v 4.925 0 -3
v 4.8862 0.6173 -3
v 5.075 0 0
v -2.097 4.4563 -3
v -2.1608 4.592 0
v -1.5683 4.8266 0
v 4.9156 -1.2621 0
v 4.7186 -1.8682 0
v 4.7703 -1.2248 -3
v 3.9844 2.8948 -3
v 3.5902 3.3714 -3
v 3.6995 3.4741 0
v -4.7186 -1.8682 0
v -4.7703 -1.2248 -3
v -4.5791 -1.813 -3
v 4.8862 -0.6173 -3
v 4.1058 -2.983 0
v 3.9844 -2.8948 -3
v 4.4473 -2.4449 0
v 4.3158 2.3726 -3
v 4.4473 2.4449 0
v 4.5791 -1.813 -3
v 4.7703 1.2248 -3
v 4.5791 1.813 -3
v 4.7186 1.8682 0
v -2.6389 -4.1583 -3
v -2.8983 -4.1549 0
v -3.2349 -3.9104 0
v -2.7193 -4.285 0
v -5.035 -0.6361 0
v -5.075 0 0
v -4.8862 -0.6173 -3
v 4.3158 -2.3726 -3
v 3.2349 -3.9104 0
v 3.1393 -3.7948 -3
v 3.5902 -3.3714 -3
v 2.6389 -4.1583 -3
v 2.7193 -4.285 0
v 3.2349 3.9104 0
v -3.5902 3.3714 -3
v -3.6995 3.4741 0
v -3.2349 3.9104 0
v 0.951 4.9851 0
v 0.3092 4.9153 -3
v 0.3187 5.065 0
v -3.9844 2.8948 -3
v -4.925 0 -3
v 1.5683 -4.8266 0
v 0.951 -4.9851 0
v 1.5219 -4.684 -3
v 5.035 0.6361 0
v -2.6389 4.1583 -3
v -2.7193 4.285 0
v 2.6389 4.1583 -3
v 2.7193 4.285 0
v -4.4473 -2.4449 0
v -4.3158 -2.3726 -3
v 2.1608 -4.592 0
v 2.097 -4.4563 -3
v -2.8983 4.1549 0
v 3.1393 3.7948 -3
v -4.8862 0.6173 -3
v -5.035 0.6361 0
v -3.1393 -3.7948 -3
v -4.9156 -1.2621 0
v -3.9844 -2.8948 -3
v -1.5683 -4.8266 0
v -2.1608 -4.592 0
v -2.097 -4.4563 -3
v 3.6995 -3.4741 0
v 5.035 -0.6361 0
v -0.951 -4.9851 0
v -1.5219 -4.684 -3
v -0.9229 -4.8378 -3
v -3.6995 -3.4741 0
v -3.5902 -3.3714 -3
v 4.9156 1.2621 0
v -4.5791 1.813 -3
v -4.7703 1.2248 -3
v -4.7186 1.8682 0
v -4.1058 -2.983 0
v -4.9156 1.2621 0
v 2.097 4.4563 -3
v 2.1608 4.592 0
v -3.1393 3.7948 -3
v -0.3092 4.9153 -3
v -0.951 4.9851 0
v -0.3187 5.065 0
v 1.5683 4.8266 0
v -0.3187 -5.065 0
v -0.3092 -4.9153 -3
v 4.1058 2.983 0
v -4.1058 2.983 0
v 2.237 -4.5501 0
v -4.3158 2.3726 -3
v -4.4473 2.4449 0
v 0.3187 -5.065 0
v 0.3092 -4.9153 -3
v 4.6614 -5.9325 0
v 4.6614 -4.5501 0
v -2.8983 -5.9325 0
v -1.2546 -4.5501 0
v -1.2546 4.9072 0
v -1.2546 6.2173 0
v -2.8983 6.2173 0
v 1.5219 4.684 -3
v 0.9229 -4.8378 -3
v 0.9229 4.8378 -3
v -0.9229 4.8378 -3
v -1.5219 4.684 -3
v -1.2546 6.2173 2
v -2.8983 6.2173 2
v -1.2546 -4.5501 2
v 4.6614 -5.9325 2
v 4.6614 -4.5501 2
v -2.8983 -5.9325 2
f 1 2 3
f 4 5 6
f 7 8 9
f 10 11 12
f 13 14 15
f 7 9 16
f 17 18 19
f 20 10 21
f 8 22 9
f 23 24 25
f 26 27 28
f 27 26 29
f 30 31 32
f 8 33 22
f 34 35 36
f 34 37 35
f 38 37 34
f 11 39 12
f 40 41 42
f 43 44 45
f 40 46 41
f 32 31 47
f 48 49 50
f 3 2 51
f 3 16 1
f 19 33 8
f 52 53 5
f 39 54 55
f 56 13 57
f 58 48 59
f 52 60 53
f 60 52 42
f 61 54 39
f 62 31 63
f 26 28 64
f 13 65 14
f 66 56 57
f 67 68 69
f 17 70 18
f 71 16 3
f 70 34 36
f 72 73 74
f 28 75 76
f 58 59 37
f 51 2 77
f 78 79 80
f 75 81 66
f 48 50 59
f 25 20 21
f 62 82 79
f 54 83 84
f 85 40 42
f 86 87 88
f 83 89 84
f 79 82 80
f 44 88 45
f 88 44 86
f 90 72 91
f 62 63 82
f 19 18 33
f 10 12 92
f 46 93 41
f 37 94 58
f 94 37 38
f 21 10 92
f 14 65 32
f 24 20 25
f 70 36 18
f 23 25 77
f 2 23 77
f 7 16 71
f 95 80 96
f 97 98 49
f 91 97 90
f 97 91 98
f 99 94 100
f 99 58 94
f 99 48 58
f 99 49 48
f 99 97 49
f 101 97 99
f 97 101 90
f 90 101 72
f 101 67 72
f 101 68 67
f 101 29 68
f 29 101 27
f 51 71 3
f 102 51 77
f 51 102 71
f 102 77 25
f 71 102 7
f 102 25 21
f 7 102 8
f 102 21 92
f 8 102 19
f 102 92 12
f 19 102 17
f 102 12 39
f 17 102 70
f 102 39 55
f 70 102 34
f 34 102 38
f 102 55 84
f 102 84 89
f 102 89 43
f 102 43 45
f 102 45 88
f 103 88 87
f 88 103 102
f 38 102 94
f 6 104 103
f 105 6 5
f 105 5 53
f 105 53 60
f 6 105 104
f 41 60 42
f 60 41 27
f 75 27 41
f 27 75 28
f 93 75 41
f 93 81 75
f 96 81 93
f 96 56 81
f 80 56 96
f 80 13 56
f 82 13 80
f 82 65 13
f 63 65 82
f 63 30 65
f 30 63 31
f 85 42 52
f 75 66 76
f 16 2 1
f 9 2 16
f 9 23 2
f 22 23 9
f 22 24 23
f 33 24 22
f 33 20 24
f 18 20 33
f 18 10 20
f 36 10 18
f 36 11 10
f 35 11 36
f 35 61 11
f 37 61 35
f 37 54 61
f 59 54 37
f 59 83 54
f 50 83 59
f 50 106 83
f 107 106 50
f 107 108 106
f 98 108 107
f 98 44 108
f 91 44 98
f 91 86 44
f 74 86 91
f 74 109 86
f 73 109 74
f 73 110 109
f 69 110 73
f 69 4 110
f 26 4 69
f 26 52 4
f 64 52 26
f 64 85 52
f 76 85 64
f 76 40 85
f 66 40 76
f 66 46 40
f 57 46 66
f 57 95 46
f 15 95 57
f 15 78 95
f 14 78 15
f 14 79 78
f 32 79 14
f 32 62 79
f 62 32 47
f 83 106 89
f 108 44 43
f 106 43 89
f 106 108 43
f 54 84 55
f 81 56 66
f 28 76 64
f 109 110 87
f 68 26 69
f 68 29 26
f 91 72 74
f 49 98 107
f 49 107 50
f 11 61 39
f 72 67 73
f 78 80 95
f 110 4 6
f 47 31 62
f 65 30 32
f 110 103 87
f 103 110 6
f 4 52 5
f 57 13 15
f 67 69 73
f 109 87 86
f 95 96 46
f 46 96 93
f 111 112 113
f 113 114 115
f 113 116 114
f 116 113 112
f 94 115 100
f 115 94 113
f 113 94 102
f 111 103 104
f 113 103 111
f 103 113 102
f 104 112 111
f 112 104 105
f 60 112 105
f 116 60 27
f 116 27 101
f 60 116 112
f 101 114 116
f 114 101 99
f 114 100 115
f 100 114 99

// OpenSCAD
$fn = 50;

difference() {
	union() {
		translate(v = [0, 0, -3.0]) {
			cylinder(h = 3, r1 = 4.925, r2 = 5.075);
		}
		linear_extrude(height = 2) {
			text(font = "Impact", halign = "center", size = 12, text = "L", valign = "center");
		}
	}
	union();
}
